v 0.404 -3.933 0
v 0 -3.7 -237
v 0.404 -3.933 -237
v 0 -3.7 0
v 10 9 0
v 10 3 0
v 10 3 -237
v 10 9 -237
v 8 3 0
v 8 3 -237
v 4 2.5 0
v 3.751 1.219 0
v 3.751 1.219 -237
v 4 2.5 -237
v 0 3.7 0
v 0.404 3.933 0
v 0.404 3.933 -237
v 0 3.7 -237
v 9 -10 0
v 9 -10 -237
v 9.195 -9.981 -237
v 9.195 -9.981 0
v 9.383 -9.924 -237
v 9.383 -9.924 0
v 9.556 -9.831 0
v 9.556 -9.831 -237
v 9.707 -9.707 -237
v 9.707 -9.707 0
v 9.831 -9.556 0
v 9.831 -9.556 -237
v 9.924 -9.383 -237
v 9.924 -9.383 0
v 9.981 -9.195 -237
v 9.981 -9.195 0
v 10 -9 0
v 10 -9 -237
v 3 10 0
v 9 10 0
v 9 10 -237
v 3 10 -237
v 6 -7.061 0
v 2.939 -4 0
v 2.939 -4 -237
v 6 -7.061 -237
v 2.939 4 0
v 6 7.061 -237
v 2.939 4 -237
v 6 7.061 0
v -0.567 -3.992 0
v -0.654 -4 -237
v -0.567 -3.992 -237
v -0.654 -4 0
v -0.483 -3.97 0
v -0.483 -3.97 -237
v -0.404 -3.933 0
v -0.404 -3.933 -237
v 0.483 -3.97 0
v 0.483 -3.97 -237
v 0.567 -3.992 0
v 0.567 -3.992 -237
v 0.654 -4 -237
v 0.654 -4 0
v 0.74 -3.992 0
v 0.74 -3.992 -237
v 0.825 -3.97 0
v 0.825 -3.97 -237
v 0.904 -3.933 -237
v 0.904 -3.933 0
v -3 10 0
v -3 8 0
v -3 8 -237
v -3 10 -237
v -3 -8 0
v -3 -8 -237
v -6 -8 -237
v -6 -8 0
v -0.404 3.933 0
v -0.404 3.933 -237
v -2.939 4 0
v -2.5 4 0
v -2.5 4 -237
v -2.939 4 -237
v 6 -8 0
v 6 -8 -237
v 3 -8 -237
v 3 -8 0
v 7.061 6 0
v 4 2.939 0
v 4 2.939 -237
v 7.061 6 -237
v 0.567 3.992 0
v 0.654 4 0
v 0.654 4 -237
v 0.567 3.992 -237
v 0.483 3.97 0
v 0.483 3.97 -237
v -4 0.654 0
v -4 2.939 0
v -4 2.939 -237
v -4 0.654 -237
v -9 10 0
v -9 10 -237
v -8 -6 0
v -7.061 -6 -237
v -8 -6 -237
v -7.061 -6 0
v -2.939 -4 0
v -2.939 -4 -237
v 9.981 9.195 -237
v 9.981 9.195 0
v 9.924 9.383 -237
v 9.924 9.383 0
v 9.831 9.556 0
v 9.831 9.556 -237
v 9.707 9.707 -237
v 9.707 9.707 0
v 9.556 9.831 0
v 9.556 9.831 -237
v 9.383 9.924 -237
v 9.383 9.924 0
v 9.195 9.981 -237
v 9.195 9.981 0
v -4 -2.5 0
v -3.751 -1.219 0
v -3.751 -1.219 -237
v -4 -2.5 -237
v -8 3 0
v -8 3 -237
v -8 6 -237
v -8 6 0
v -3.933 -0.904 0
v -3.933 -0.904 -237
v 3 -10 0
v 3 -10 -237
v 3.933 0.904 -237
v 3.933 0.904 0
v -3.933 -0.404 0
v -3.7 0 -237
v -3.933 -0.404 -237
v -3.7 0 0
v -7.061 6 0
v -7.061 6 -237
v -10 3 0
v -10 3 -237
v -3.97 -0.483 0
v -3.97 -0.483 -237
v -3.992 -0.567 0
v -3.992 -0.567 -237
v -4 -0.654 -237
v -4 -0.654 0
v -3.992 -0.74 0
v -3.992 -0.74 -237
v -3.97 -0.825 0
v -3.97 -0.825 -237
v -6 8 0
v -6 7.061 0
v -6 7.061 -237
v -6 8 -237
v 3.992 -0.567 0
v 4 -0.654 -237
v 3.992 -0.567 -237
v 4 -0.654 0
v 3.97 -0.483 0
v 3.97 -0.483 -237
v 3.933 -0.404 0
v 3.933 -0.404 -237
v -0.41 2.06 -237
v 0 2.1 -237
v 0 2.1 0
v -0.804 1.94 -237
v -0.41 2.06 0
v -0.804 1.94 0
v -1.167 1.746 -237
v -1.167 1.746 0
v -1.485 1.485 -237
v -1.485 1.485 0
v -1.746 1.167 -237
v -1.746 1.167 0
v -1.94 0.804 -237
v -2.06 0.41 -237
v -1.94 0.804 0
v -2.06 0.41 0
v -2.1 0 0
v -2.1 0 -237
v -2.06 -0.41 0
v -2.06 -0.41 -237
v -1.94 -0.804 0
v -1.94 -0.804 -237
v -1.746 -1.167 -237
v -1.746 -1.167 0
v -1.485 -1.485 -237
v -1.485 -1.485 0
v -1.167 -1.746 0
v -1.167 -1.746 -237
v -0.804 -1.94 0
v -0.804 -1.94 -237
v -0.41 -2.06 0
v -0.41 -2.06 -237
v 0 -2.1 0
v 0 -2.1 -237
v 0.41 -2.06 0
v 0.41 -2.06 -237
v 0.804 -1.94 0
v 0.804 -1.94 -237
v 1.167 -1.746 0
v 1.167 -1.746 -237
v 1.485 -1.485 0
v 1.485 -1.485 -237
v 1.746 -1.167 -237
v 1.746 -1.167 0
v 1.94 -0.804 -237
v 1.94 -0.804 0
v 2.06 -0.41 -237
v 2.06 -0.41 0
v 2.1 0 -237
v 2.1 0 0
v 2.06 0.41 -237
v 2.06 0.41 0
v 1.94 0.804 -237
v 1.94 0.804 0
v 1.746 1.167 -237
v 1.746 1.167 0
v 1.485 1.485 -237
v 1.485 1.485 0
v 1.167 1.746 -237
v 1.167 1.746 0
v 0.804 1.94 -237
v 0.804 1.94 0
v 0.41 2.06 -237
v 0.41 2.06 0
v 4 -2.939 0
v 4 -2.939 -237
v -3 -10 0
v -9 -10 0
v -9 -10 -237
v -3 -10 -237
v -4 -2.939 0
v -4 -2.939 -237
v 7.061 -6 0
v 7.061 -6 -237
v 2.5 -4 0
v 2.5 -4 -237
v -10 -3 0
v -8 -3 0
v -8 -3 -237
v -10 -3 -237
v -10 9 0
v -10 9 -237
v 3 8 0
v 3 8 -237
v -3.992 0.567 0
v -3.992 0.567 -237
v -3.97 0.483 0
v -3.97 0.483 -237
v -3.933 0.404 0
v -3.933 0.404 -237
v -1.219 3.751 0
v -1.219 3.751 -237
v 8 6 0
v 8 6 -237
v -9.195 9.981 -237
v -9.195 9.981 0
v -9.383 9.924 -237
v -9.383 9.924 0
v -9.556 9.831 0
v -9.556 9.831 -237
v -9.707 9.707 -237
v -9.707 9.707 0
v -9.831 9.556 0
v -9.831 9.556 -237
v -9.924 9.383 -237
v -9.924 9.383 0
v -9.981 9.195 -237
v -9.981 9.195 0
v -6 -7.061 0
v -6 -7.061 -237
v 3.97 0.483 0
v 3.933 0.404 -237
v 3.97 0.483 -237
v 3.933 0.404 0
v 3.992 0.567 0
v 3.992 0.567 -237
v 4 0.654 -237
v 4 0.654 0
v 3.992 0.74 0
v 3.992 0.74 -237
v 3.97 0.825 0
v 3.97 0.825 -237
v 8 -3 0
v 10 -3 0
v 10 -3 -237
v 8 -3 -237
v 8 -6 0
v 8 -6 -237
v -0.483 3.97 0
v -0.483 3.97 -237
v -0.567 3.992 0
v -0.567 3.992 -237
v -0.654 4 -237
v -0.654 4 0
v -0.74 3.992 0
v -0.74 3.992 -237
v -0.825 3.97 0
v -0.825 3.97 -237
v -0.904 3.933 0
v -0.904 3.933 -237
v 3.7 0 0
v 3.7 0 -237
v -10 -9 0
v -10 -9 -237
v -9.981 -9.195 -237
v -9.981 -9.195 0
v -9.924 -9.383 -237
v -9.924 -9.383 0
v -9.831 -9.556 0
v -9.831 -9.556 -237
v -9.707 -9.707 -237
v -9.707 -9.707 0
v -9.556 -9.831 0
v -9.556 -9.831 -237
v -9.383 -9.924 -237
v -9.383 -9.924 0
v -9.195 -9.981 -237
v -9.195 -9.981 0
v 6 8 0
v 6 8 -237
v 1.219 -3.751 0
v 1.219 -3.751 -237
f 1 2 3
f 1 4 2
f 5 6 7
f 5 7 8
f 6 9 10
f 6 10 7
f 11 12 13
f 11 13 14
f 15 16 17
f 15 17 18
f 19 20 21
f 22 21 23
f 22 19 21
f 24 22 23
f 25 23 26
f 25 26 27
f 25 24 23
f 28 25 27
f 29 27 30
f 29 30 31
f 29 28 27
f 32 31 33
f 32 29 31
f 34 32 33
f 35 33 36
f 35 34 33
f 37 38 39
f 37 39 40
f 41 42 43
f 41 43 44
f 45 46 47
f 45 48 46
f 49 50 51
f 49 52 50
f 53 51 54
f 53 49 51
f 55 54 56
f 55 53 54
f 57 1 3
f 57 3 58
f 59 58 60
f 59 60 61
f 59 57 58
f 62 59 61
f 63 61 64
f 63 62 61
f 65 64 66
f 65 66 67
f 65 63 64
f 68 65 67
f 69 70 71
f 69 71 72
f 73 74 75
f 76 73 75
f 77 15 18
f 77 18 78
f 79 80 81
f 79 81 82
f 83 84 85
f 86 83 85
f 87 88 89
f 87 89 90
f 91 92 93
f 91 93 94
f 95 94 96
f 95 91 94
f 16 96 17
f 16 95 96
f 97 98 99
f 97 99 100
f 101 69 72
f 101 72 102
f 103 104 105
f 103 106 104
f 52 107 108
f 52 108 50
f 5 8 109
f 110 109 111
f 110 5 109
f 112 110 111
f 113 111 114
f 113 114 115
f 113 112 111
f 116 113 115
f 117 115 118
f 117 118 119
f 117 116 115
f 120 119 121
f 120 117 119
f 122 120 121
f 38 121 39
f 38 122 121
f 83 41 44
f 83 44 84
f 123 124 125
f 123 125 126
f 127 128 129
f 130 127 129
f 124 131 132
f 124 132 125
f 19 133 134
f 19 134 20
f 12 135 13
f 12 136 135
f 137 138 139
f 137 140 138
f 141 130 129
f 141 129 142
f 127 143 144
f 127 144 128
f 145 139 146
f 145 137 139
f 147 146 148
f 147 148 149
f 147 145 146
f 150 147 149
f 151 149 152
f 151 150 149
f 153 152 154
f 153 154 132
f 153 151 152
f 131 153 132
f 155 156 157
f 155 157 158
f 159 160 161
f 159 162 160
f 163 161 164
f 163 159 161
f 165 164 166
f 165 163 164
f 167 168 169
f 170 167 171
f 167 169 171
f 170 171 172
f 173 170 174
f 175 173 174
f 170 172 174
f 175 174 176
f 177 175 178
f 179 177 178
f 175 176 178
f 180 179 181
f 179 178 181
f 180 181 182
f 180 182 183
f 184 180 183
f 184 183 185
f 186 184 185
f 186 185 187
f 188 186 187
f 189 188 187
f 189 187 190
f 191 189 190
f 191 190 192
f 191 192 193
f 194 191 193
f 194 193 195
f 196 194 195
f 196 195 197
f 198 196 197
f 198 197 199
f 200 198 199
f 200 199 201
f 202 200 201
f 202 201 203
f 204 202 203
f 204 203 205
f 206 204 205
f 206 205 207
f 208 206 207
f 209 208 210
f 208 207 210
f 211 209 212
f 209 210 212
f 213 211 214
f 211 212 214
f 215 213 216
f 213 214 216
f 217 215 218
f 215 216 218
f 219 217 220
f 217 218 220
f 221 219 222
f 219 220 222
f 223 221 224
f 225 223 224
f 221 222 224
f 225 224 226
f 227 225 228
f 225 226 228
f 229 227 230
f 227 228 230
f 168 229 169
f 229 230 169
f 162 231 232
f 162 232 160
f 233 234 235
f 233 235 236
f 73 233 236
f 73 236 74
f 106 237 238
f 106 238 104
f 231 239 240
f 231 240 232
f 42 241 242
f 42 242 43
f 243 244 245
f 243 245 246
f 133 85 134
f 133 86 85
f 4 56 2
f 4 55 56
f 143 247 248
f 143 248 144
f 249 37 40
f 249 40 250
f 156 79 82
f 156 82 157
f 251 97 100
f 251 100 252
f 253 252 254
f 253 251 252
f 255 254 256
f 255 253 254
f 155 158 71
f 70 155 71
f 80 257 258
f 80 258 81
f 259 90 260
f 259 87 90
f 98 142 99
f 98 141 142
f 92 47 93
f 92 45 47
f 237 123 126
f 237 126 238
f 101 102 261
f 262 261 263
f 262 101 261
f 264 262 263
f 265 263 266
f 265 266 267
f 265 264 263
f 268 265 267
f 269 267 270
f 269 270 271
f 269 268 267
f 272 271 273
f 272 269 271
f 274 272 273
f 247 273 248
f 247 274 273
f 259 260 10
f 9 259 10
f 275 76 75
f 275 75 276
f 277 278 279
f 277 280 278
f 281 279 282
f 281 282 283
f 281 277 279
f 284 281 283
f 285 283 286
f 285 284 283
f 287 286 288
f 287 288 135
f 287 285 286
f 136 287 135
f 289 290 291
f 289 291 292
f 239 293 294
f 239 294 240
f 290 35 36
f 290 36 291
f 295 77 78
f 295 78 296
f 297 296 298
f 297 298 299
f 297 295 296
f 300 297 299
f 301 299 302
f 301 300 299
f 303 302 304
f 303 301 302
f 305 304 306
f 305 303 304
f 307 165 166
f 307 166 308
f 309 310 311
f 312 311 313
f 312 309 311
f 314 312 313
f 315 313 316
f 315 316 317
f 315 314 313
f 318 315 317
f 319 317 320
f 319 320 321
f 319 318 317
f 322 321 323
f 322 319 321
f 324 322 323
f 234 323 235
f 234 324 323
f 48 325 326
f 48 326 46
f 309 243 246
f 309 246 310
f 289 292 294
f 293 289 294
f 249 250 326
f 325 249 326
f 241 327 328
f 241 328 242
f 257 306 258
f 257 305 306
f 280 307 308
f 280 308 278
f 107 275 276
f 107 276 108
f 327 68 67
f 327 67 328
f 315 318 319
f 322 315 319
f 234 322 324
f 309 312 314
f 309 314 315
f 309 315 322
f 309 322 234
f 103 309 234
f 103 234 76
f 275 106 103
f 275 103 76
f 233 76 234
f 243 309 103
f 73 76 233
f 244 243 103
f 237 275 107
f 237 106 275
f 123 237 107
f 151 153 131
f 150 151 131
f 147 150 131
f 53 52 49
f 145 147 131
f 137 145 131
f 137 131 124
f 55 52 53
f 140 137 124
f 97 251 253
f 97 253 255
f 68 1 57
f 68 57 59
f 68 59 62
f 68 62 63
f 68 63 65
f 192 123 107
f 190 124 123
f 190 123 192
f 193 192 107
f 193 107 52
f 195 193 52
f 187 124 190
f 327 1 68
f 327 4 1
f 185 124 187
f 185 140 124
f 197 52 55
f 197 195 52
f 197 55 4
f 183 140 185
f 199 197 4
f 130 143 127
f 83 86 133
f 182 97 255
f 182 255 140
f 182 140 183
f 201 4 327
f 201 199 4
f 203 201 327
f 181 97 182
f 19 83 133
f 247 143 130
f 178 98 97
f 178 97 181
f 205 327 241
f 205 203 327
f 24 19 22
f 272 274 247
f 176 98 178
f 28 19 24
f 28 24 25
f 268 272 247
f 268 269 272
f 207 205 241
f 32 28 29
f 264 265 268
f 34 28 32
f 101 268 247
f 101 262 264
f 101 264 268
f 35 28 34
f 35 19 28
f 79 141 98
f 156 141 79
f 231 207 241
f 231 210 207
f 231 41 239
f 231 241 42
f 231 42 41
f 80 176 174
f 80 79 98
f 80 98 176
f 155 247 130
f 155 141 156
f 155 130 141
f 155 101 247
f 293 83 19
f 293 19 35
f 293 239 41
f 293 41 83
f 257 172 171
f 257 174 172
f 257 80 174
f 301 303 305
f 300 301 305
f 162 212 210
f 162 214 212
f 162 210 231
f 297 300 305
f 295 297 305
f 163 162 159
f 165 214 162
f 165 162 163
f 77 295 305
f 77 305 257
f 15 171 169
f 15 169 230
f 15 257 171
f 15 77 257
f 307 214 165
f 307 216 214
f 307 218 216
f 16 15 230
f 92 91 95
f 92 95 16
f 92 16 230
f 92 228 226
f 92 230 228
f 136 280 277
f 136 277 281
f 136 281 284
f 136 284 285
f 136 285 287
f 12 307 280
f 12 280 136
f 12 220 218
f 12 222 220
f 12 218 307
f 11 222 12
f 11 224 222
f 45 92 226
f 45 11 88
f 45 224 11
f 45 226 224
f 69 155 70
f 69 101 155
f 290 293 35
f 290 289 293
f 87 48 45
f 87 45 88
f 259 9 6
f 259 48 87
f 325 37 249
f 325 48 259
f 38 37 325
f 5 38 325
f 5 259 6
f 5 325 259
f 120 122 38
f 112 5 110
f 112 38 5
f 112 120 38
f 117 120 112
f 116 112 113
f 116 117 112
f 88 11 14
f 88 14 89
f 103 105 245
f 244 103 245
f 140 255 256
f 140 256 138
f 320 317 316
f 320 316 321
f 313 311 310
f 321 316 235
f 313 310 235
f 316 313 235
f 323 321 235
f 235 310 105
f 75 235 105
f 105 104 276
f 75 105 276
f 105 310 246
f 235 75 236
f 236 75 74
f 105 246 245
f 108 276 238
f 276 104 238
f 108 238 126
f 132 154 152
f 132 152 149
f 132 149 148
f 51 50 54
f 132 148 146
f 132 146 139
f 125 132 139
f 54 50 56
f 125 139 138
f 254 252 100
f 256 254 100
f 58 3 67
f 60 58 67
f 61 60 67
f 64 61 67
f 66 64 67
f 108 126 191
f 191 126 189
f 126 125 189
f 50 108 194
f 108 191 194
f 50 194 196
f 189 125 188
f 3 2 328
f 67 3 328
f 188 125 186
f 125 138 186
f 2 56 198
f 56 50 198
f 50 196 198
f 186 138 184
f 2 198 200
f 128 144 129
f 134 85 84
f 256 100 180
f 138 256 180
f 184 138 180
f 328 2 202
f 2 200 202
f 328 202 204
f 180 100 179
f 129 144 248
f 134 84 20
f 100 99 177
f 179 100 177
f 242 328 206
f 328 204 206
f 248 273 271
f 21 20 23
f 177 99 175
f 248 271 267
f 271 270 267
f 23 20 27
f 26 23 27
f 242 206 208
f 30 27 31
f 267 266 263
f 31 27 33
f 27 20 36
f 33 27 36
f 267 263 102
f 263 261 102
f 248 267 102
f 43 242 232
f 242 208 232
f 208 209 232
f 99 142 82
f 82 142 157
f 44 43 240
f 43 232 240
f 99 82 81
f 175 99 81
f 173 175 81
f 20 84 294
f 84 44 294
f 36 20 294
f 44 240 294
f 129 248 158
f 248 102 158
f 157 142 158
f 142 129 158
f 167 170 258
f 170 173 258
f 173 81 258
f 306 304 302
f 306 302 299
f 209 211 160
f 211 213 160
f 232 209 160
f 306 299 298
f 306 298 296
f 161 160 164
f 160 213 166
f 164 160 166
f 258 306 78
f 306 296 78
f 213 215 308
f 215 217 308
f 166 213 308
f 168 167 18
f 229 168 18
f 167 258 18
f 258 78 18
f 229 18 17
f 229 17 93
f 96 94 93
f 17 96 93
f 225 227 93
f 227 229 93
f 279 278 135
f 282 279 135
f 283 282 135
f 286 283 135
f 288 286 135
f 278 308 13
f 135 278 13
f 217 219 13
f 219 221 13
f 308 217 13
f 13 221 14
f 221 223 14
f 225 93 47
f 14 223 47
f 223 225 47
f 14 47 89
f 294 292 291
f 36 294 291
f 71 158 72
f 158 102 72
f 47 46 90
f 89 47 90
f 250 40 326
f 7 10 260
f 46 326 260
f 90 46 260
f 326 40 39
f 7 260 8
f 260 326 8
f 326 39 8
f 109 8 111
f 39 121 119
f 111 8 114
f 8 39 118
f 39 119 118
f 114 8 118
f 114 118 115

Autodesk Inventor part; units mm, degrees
sketch "Sketch_75" plane through (0, 0, 0) normal (0, 0, 1) x (1, 0, 0)
  line L0 (-10, -3) -> (-10, -9)
  arc A0 (-10, -9) -> (-9, -10) centre (-9, -9) ccw
  line L1 (-9, -10) -> (-3, -10)
  line L2 (-3, -10) -> (-3, -8)
  line L3 (-3, -8) -> (-6, -8)
  line L4 (-6, -8) -> (-6, -7.0607)
  line L5 (-6, -7.0607) -> (-2.9393, -4)
  line L6 (-2.9393, -4) -> (-0.6536, -4)
  arc A1 (-0.6536, -4) -> (-0.4036, -3.933) centre (-0.6536, -3.5) ccw
  line L7 (-0.4036, -3.933) -> (0, -3.7)
  line L8 (0, -3.7) -> (0.4036, -3.933)
  arc A2 (0.4036, -3.933) -> (0.9036, -3.933) centre (0.6536, -3.5) ccw
  line L9 (0.9036, -3.933) -> (1.2189, -3.751)
  line L10 (1.2189, -3.751) -> (2.5, -4)
  line L11 (2.5, -4) -> (2.9393, -4)
  line L12 (2.9393, -4) -> (6, -7.0607)
  line L13 (6, -7.0607) -> (6, -8)
  line L14 (6, -8) -> (3, -8)
  line L15 (3, -8) -> (3, -10)
  line L16 (3, -10) -> (9, -10)
  arc A3 (9, -10) -> (10, -9) centre (9, -9) ccw
  line L17 (10, -9) -> (10, -3)
  line L18 (10, -3) -> (8, -3)
  line L19 (8, -3) -> (8, -6)
  line L20 (8, -6) -> (7.0607, -6)
  line L21 (7.0607, -6) -> (4, -2.9393)
  line L22 (4, -2.9393) -> (4, -0.6536)
  arc A4 (4, -0.6536) -> (3.933, -0.4036) centre (3.5, -0.6536) ccw
  line L23 (3.933, -0.4036) -> (3.7, 0)
  line L24 (3.7, 0) -> (3.933, 0.4036)
  arc A5 (3.933, 0.4036) -> (3.933, 0.9036) centre (3.5, 0.6536) ccw
  line L25 (3.933, 0.9036) -> (3.751, 1.2189)
  line L26 (3.751, 1.2189) -> (4, 2.5)
  line L27 (4, 2.5) -> (4, 2.9393)
  line L28 (4, 2.9393) -> (7.0607, 6)
  line L29 (7.0607, 6) -> (8, 6)
  line L30 (8, 6) -> (8, 3)
  line L31 (8, 3) -> (10, 3)
  line L32 (10, 3) -> (10, 9)
  arc A6 (10, 9) -> (9, 10) centre (9, 9) ccw
  line L33 (9, 10) -> (3, 10)
  line L34 (3, 10) -> (3, 8)
  line L35 (3, 8) -> (6, 8)
  line L36 (6, 8) -> (6, 7.0607)
  line L37 (6, 7.0607) -> (2.9393, 4)
  line L38 (2.9393, 4) -> (0.6536, 4)
  arc A7 (0.6536, 4) -> (0.4036, 3.933) centre (0.6536, 3.5) ccw
  line L39 (0.4036, 3.933) -> (0, 3.7)
  line L40 (0, 3.7) -> (-0.4036, 3.933)
  arc A8 (-0.4036, 3.933) -> (-0.9036, 3.933) centre (-0.6536, 3.5) ccw
  line L41 (-0.9036, 3.933) -> (-1.2189, 3.751)
  line L42 (-1.2189, 3.751) -> (-2.5, 4)
  line L43 (-2.5, 4) -> (-2.9393, 4)
  line L44 (-2.9393, 4) -> (-6, 7.0607)
  line L45 (-6, 7.0607) -> (-6, 8)
  line L46 (-6, 8) -> (-3, 8)
  line L47 (-3, 8) -> (-3, 10)
  line L48 (-3, 10) -> (-9, 10)
  arc A9 (-9, 10) -> (-10, 9) centre (-9, 9) ccw
  line L49 (-10, 9) -> (-10, 3)
  line L50 (-10, 3) -> (-8, 3)
  line L51 (-8, 3) -> (-8, 6)
  line L52 (-8, 6) -> (-7.0607, 6)
  line L53 (-7.0607, 6) -> (-4, 2.9393)
  line L54 (-4, 2.9393) -> (-4, 0.6536)
  arc A10 (-4, 0.6536) -> (-3.933, 0.4036) centre (-3.5, 0.6536) ccw
  line L55 (-3.933, 0.4036) -> (-3.7, 0)
  line L56 (-3.7, 0) -> (-3.933, -0.4036)
  arc A11 (-3.933, -0.4036) -> (-3.933, -0.9036) centre (-3.5, -0.6536) ccw
  line L57 (-3.933, -0.9036) -> (-3.751, -1.2189)
  line L58 (-3.751, -1.2189) -> (-4, -2.5)
  line L59 (-4, -2.5) -> (-4, -2.9393)
  line L60 (-4, -2.9393) -> (-7.0607, -6)
  line L61 (-7.0607, -6) -> (-8, -6)
  line L62 (-8, -6) -> (-8, -3)
  line L63 (-8, -3) -> (-10, -3)
extrude "Extrusion1" add sketch "Sketch_75" against normal blind 237
sketch "Sketch2" plane through (0, 0, -237) normal (0, 0, -1) x (-1, 0, 0)
  point P0 (0, 0)
hole "Hole1" at (0, 0, -237) direction (0, 0, 1) diameter 4.2 depth 237
ref_plane "C1_XY" through (0, 0, 0) normal (0, 0, 1) x (1, 0, 0)
ref_plane "C1_YZ" through (0, 0, 0) normal (1, 0, 0) x (0, 1, 0)
ref_plane "C1_ZX" through (0, 0, 0) normal (0, 1, 0) x (0, 0, 1)
properties part number "NFS5-2020-237"
